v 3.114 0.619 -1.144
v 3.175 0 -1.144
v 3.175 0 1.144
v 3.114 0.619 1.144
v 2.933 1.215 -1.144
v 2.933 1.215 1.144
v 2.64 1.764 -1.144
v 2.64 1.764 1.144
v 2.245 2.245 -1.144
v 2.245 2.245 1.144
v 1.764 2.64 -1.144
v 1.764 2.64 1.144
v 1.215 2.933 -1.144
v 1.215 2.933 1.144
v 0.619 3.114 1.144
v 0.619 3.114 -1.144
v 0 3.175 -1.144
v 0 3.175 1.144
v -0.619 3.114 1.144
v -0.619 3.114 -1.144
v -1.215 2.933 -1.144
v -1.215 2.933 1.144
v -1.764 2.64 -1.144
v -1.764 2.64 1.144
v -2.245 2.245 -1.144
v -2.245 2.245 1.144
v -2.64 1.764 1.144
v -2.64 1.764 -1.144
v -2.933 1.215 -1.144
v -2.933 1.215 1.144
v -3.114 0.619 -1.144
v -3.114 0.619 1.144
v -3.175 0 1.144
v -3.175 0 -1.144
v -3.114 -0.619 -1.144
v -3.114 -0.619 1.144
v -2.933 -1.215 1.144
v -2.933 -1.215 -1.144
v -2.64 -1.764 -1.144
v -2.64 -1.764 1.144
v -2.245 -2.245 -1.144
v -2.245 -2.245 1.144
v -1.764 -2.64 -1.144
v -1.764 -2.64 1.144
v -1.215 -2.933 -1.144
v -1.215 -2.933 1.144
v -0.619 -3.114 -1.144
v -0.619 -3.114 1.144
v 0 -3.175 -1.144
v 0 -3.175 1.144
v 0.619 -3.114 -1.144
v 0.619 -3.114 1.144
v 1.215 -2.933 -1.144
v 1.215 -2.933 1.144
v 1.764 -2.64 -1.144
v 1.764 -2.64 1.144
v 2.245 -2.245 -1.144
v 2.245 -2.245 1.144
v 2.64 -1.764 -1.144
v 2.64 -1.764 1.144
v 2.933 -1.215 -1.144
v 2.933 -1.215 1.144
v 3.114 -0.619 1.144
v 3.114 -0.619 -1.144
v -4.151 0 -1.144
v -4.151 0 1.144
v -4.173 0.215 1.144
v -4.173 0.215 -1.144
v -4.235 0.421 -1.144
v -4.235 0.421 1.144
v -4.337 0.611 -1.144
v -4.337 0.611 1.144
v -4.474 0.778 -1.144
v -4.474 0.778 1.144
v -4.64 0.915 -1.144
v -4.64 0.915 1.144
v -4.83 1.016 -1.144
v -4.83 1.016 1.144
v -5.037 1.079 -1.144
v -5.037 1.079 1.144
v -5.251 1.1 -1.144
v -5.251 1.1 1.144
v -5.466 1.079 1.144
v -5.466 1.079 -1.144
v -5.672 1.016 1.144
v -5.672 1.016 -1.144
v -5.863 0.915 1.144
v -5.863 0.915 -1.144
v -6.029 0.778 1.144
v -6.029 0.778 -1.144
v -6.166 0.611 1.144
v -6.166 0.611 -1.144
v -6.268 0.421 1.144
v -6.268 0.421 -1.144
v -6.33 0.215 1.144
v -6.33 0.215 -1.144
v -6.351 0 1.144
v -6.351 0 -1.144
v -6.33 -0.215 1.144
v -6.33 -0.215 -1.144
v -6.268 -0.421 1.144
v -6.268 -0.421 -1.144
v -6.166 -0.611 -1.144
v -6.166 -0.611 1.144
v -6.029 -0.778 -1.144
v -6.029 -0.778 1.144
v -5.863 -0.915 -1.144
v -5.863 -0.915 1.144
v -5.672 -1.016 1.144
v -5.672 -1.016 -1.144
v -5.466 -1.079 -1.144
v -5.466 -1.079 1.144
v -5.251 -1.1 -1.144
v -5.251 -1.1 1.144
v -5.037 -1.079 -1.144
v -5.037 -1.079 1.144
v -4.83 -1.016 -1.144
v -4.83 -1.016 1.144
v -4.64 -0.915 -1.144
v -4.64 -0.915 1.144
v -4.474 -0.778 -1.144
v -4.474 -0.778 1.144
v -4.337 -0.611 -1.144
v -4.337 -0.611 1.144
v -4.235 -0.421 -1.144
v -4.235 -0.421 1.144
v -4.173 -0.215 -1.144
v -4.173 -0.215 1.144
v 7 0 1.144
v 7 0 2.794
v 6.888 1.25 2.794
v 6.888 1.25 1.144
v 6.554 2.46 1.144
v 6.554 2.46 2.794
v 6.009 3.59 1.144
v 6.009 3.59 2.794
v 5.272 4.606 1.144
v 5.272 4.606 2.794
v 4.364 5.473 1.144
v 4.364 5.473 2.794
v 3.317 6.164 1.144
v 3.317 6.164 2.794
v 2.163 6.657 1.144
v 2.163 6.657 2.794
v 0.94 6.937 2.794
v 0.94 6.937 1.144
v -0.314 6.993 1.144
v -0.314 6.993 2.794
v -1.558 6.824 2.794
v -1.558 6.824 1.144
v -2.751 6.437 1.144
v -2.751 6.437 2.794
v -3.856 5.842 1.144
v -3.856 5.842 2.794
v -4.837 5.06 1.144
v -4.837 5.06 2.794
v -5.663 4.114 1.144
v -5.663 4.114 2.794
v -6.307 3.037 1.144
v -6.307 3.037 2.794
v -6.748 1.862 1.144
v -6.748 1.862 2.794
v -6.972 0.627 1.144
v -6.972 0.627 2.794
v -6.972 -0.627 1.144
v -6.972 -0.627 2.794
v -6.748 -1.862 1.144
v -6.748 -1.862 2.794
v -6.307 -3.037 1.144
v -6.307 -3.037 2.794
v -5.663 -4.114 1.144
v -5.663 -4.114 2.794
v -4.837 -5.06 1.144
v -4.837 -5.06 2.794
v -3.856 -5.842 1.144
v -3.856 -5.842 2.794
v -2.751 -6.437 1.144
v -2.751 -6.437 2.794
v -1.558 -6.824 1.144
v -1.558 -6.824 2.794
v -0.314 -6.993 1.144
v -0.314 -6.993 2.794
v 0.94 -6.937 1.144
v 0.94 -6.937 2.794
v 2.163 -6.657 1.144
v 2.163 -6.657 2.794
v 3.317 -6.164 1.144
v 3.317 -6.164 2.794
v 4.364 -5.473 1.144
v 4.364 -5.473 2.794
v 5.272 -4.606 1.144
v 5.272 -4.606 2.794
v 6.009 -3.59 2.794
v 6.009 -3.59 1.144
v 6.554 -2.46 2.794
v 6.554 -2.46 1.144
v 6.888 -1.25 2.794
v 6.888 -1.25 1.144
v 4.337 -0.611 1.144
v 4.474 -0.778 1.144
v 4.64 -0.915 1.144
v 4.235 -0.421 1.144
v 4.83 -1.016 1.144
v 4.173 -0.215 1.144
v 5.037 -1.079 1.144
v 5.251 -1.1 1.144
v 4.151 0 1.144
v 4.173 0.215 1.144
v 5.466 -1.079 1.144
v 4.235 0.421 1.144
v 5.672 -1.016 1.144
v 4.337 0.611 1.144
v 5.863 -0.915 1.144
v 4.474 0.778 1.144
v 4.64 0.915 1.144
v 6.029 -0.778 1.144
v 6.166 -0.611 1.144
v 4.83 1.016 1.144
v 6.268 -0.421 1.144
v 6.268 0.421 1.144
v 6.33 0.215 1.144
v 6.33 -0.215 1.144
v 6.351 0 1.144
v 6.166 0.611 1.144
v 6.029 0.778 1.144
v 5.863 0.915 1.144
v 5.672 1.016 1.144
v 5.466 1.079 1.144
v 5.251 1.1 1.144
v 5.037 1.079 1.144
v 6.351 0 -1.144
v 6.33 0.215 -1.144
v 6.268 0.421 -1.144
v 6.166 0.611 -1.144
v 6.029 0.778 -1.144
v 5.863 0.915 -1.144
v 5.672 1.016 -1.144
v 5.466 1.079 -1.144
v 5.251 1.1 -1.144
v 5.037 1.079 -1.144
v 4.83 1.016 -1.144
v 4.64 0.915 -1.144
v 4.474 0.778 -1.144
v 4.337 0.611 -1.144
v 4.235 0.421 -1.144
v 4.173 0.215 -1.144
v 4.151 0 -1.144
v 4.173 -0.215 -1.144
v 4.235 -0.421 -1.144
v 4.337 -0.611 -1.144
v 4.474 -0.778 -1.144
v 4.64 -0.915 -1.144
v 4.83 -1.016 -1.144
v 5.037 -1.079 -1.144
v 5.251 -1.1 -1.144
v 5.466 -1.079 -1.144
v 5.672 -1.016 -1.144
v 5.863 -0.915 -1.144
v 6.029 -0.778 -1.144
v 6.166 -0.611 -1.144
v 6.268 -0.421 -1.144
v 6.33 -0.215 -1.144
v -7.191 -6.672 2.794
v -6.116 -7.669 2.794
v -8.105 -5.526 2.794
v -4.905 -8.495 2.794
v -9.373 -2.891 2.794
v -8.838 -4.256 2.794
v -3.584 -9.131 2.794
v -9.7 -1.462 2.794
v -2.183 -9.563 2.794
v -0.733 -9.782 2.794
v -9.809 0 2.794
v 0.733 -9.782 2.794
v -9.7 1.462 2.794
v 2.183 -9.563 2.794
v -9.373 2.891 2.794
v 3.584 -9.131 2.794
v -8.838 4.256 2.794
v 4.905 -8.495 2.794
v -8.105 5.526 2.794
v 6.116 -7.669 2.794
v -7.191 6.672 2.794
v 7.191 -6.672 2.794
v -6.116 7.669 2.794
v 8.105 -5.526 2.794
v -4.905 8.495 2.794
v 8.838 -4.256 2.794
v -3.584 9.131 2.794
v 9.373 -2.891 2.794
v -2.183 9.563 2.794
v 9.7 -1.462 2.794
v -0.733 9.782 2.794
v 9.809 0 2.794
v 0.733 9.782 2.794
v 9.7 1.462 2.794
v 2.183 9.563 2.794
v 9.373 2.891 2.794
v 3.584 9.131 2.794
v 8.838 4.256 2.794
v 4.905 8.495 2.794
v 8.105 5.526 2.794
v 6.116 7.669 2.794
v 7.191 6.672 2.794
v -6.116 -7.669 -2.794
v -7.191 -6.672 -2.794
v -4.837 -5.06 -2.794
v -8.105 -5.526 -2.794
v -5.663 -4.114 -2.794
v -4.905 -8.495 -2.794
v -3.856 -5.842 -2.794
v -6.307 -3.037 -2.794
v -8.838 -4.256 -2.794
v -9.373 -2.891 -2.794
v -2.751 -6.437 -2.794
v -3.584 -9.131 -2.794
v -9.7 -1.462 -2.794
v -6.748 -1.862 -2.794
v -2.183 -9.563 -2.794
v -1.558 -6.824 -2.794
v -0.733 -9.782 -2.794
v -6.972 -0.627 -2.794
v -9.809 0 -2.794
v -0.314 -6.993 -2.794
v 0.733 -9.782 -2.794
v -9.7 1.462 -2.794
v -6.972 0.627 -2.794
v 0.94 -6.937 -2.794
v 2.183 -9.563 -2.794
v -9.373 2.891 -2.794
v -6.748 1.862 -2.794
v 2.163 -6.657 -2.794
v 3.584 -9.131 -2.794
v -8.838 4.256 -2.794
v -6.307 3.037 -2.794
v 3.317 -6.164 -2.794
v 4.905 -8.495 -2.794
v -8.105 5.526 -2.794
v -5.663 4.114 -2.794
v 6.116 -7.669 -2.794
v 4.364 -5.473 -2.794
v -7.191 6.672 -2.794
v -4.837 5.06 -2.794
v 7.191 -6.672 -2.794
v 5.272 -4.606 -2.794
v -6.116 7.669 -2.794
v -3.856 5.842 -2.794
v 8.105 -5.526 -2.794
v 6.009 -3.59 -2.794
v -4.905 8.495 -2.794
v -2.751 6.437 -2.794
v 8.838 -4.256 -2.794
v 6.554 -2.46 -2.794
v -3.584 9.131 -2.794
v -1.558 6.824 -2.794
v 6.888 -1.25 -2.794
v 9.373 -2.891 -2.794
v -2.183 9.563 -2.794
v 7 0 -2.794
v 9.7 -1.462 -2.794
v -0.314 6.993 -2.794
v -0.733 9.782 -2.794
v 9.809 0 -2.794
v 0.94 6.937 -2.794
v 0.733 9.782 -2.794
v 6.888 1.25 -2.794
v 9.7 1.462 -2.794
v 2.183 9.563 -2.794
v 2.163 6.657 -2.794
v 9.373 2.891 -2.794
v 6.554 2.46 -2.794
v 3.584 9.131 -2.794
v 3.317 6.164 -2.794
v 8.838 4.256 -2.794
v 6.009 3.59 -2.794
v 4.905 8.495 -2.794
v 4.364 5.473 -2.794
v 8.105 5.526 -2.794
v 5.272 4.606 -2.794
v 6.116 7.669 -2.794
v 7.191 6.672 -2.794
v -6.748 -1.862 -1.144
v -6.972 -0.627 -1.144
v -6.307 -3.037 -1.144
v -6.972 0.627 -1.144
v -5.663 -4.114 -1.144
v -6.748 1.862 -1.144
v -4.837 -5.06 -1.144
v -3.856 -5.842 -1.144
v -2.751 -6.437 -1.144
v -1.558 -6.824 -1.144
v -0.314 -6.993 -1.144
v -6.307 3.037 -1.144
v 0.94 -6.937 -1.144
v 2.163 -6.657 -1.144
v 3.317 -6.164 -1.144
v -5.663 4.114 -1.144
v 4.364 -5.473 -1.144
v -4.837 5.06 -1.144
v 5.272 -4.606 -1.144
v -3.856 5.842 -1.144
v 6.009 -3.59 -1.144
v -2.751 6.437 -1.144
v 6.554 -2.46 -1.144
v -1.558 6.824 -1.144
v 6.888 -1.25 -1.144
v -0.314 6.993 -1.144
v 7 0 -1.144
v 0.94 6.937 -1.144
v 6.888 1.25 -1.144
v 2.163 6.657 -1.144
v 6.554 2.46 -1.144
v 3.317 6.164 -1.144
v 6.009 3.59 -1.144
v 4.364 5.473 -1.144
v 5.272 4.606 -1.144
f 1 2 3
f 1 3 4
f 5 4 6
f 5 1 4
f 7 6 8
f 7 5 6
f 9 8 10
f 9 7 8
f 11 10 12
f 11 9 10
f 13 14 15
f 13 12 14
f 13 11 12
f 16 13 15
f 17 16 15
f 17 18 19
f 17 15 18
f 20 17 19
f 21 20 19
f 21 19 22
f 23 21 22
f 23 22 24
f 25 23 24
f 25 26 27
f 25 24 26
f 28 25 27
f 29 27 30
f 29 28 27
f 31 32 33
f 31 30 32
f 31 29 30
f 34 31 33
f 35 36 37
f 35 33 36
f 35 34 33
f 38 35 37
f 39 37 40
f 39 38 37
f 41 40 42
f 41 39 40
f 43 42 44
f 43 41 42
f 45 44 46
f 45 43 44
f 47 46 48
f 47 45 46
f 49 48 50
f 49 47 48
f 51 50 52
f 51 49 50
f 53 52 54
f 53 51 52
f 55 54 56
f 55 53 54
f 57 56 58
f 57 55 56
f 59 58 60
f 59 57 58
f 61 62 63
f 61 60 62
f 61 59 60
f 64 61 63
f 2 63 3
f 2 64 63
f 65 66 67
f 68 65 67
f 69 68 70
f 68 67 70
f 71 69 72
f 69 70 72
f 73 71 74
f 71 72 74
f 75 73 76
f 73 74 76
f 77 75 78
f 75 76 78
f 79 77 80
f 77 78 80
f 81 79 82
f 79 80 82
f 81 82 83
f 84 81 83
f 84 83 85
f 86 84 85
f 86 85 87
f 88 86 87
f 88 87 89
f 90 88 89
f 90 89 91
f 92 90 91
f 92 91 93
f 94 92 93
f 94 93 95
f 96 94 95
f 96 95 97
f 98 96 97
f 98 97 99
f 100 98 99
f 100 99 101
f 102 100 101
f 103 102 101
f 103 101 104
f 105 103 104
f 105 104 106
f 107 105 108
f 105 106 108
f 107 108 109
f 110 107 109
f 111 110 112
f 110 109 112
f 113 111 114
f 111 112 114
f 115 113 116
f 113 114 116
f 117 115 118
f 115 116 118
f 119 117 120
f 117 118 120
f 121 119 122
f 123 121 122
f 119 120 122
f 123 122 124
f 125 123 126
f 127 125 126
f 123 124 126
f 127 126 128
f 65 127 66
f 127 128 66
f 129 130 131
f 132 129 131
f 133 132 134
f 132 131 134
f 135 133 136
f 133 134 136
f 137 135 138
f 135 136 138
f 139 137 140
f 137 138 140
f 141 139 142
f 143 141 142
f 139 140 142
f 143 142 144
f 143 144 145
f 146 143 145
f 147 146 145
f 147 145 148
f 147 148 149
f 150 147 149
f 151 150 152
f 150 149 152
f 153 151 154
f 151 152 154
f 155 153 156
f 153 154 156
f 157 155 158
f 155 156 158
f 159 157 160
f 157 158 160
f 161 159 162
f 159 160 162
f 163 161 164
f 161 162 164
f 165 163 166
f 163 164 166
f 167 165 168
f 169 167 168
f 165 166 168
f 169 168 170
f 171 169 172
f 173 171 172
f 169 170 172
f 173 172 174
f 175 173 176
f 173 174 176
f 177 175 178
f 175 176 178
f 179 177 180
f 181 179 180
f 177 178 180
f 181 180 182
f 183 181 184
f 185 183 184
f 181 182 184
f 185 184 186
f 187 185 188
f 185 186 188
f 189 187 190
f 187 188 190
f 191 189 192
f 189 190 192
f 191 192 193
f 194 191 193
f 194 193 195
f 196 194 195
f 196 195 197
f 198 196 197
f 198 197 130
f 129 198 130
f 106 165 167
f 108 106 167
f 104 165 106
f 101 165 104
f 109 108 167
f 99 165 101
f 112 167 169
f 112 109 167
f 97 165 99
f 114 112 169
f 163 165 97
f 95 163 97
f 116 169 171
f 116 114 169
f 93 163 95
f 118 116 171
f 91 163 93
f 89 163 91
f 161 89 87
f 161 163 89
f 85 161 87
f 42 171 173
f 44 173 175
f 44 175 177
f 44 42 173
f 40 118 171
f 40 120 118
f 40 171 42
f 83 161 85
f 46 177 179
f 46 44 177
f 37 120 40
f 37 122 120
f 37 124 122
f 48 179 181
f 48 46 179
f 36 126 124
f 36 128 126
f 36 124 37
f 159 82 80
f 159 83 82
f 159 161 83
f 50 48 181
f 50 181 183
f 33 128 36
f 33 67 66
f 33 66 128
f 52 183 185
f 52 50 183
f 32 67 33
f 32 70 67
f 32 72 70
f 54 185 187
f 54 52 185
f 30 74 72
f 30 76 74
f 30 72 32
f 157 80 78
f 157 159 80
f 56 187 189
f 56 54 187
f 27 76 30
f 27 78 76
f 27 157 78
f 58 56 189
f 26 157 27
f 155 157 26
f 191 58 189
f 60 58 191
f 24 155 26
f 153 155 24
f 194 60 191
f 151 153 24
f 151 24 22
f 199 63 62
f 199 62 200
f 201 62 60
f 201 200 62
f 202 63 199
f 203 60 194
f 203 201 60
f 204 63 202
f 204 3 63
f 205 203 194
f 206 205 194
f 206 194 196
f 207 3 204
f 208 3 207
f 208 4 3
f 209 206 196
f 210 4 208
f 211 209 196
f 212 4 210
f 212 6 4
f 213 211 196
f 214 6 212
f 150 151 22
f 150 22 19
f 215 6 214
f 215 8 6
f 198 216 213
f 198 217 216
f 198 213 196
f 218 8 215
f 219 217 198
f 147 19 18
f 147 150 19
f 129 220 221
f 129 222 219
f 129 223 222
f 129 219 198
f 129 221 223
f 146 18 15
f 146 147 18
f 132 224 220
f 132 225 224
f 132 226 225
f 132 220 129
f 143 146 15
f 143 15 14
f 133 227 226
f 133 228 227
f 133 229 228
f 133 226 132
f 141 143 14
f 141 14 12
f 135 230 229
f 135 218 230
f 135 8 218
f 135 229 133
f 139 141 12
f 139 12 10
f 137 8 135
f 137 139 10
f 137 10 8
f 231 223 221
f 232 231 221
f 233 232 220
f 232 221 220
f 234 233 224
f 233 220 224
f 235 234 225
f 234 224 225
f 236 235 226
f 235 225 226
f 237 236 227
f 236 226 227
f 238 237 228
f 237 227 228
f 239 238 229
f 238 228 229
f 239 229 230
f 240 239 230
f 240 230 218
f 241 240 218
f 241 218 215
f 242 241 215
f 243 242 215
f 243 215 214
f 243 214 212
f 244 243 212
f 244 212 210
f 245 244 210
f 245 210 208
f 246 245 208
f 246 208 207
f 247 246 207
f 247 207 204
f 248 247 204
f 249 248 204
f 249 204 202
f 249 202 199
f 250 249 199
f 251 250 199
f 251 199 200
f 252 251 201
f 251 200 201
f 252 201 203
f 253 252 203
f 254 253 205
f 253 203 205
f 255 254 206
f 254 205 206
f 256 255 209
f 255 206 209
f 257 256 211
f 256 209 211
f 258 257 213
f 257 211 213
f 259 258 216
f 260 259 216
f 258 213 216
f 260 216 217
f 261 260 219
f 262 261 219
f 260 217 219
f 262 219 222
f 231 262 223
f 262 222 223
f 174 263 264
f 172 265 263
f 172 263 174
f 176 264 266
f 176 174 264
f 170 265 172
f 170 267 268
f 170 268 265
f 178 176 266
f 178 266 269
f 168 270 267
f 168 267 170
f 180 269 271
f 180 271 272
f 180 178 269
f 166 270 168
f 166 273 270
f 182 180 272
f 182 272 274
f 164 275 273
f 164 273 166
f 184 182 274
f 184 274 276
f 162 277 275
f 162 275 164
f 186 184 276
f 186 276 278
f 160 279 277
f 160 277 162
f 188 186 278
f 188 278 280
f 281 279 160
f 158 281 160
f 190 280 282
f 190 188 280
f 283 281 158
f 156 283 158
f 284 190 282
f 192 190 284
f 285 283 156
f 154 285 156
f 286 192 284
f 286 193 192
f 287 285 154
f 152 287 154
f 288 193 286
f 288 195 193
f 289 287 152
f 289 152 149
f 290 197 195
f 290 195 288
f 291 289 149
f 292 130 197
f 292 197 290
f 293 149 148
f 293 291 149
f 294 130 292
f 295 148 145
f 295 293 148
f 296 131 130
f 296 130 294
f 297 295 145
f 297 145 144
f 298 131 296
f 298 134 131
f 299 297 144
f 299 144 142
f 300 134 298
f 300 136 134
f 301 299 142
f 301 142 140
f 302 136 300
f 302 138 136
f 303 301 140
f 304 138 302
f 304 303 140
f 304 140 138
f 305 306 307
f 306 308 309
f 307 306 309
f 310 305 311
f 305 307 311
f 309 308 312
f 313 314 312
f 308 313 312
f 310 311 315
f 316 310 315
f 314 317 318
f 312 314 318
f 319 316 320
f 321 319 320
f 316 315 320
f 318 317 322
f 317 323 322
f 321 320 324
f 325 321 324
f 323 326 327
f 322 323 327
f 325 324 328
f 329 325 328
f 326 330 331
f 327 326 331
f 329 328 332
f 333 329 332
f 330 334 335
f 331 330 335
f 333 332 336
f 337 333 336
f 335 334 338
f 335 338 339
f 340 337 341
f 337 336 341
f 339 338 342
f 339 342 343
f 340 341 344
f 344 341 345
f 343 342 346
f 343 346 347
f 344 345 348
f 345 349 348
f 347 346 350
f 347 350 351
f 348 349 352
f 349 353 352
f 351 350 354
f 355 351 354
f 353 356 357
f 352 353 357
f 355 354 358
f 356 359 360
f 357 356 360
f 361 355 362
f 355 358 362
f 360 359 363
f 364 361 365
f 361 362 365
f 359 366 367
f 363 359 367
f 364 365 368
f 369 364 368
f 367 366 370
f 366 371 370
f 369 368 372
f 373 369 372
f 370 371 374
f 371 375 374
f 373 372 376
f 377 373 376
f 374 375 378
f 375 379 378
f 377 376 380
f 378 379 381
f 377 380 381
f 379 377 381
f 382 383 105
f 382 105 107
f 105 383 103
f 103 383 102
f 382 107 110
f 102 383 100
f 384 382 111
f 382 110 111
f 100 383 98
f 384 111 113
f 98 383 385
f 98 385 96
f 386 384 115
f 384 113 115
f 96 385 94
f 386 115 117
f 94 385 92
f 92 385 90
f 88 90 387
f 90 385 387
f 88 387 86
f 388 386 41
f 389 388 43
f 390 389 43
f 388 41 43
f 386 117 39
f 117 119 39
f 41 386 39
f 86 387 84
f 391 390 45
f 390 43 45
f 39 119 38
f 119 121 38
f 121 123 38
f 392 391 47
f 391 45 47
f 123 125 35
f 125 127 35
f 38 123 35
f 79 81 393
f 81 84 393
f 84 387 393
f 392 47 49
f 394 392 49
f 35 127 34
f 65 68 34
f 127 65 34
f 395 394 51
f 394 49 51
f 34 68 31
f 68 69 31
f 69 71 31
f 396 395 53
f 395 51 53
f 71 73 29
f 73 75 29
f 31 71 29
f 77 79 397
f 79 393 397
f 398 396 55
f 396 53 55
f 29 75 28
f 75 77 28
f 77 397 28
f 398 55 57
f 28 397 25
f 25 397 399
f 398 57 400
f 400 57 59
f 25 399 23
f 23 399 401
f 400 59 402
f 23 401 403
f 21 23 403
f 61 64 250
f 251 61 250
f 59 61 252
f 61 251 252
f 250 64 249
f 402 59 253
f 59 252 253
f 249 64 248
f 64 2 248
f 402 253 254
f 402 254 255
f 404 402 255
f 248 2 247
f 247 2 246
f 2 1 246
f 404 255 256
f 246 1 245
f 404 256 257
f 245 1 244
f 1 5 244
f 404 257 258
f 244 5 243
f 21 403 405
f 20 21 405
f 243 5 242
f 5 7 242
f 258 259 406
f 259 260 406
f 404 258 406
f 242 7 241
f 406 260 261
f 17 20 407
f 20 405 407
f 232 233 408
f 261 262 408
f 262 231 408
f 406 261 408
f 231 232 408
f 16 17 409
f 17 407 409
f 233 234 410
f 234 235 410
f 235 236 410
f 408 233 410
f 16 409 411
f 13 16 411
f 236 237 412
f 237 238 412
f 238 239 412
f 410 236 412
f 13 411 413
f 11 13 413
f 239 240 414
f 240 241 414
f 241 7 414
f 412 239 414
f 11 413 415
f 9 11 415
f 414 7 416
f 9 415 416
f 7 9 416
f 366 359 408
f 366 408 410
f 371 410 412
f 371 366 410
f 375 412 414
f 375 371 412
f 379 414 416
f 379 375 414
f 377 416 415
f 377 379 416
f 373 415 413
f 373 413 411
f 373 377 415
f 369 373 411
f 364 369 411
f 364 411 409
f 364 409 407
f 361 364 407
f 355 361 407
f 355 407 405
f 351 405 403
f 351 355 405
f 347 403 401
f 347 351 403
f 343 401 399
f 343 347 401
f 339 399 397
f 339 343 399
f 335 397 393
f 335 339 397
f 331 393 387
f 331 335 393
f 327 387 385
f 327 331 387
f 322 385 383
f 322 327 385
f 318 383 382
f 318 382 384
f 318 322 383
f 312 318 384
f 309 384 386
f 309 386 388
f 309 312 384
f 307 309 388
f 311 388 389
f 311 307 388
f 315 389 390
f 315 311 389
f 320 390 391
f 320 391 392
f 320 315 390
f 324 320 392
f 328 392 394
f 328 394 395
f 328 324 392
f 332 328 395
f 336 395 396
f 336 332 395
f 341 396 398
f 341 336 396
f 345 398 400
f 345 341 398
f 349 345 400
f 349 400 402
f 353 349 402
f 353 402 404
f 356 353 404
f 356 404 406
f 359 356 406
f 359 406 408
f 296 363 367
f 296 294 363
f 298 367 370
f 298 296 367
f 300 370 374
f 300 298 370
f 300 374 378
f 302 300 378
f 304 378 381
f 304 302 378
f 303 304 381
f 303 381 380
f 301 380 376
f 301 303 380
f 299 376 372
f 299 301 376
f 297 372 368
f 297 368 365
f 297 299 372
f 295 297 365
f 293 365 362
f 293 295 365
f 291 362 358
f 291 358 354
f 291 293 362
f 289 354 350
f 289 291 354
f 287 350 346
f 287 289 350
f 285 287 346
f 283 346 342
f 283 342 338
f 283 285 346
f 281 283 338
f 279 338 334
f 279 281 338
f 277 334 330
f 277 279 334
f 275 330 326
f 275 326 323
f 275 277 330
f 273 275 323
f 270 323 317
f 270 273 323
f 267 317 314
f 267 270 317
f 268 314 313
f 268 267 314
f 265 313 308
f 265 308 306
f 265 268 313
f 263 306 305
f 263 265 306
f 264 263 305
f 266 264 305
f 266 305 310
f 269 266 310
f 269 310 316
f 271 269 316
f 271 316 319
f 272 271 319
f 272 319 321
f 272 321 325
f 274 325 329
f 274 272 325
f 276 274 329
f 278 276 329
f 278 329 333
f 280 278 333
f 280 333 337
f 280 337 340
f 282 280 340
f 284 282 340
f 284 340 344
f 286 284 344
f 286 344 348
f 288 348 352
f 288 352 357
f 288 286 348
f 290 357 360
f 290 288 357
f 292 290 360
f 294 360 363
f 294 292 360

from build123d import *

# Parameters (mm, degrees)
SKETCH1_R           = 9.80909091
SKETCH1_R_2         = 3.175
BOSS_EXTRUDE1_DEPTH = 2.794
CUT_EXTRUDE1_START  = -1.65
SKETCH2_R           = 1.1
CUT_EXTRUDE1_DEPTH  = 1.65
SKETCH2_3_R         = 1.1
CUT_EXTRUDE2_DEPTH  = 15.955342623


with BuildPart() as part:
    # Sketch1 → Boss-Extrude1 (new, symmetric)
    with BuildSketch(Plane.XY):
        Circle(SKETCH1_R)
        Circle(SKETCH1_R_2, mode=Mode.SUBTRACT)
    extrude(amount=BOSS_EXTRUDE1_DEPTH, both=True)

    # Sketch2 → Cut-Extrude1 (cut)
    with BuildSketch(Plane.XY.offset(2.794).offset(CUT_EXTRUDE1_START)):
        with BuildLine():
            ThreePointArc((7, 0), (0, 7), (-7, 0))
            ThreePointArc((-7, 0), (0, -7), (7, 0))
        make_face()
        with BuildLine():
            ThreePointArc((-4.15145, 0), (-5.25145, -1.1), (-6.35145, 0))
            ThreePointArc((-6.35145, 0), (-5.25145, 1.1), (-4.15145, 0))
        make_face(mode=Mode.SUBTRACT)
        with BuildLine():
            ThreePointArc((3.175, 0), (0, -3.175), (-3.175, 0))
            ThreePointArc((-3.175, 0), (0, 3.175), (3.175, 0))
        make_face(mode=Mode.SUBTRACT)
        with Locations((5.25145, 0)):
            Circle(SKETCH2_R, mode=Mode.SUBTRACT)
    cut_extrude1 = extrude(amount=CUT_EXTRUDE1_DEPTH, mode=Mode.SUBTRACT)

    # Mirror1: Cut-Extrude1 across plane
    add(cut_extrude1.mirror(Plane.XY), mode=Mode.SUBTRACT)

    # Sketch2<3> → Cut-Extrude2 (cut, through all)
    with BuildSketch(Plane.XY.offset(2.794)):
        with Locations((-5.25145, 0)):
            Circle(SKETCH2_3_R)
        with Locations((5.25145, 0)):
            Circle(SKETCH2_3_R)
    extrude(amount=-CUT_EXTRUDE2_DEPTH, mode=Mode.SUBTRACT)


solid = part.part
